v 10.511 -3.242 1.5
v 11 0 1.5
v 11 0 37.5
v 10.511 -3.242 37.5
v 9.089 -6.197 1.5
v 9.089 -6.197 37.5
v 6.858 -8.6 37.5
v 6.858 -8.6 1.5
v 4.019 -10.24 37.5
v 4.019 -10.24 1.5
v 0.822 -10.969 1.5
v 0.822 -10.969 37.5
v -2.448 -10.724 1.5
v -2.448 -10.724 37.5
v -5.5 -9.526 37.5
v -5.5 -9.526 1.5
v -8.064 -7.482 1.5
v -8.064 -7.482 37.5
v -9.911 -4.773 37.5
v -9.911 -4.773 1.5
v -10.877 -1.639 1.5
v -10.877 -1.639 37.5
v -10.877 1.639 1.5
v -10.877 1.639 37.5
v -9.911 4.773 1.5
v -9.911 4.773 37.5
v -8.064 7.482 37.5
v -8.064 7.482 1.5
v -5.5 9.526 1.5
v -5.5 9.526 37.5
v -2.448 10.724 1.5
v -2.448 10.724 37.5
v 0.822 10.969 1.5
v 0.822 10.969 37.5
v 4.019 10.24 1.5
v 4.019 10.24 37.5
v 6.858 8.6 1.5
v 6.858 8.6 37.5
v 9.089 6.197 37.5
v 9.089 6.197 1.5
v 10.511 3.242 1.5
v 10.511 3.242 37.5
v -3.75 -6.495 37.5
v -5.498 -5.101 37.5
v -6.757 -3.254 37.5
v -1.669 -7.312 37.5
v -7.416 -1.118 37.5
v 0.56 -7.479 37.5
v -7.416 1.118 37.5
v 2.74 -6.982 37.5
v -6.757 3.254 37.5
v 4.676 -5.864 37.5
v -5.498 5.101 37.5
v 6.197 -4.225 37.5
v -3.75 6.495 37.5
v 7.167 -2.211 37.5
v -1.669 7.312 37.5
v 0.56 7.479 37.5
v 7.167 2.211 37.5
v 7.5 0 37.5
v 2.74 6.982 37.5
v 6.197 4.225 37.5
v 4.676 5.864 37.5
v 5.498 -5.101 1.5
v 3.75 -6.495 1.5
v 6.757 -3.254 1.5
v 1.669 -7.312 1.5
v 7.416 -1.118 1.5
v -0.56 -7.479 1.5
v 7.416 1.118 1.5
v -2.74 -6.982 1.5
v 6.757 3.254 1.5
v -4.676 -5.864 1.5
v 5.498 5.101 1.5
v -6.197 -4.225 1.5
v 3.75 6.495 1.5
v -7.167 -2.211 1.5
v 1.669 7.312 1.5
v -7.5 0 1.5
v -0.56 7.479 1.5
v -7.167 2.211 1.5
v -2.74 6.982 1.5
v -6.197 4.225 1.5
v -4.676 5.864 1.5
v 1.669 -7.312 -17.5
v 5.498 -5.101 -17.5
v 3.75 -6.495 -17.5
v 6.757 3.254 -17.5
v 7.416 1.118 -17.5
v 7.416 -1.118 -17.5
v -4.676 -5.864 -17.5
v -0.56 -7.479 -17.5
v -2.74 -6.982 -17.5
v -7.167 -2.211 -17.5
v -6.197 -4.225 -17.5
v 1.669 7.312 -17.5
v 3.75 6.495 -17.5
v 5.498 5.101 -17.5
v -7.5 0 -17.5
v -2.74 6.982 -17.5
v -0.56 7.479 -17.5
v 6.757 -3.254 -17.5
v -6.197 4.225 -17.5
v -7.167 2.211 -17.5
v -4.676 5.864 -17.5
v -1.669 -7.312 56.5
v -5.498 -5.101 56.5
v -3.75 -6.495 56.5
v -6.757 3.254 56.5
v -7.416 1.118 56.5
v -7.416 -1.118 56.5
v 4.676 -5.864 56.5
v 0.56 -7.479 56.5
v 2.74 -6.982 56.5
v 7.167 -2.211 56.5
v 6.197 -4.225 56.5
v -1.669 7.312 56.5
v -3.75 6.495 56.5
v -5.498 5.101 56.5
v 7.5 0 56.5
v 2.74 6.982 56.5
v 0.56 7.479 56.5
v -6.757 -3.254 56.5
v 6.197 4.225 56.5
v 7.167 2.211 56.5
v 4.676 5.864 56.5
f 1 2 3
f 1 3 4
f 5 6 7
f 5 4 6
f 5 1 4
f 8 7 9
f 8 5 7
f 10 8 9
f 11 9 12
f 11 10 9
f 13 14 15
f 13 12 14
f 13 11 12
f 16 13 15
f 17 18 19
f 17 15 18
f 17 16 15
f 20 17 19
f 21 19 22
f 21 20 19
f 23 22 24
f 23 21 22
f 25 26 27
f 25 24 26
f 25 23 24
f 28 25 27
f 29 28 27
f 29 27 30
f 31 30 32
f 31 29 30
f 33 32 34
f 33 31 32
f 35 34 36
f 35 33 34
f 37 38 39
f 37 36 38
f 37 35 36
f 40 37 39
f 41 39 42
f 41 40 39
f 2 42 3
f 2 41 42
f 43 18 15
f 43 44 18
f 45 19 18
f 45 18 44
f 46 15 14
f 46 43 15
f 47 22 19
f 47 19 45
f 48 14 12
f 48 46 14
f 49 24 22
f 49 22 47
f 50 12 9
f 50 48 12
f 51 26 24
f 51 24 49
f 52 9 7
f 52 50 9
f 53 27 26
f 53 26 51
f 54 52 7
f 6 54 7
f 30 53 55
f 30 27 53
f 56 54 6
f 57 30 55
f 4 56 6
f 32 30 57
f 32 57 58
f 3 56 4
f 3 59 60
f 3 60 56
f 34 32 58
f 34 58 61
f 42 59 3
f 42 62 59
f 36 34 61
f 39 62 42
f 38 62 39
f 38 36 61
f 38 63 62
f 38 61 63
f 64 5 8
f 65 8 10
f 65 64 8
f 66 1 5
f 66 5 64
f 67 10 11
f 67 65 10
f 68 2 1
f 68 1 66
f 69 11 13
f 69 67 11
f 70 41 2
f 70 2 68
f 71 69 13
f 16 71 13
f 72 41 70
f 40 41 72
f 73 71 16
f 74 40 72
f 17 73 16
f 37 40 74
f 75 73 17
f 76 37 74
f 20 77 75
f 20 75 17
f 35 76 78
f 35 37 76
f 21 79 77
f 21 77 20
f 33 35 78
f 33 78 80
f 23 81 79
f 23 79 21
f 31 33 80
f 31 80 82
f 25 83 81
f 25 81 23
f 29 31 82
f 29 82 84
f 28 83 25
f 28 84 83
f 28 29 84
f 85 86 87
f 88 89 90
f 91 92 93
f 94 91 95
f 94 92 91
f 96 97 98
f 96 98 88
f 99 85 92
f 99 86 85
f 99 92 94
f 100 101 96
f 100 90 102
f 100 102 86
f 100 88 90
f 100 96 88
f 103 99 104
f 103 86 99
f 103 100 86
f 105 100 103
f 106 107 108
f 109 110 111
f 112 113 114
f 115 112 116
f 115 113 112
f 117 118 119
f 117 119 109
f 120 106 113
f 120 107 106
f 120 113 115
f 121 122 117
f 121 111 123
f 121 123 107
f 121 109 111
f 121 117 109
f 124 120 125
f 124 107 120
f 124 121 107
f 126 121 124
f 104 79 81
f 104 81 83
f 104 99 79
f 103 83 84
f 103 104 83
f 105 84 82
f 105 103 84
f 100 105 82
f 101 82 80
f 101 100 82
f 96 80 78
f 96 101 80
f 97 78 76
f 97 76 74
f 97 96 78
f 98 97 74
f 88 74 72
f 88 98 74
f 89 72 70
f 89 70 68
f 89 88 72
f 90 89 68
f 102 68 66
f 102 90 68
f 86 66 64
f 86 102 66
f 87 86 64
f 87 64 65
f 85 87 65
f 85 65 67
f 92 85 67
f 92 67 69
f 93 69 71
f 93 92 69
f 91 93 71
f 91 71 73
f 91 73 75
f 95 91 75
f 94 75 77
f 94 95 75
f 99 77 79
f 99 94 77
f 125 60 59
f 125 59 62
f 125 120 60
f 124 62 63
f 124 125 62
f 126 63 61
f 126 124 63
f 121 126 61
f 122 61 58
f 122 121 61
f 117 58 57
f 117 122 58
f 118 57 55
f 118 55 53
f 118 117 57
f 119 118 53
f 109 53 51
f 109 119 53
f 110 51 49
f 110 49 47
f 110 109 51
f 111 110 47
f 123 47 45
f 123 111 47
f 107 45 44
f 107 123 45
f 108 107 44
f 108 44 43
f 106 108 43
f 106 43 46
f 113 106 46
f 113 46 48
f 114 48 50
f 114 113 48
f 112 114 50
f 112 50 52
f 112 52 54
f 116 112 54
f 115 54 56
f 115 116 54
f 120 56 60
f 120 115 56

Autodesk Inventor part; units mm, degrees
ref_plane "YZ Plane" through (0, 0, 0) normal (1, 0, 0) x (0, 1, 0)
ref_plane "Start Plane" through (0, 0, 0) normal (0, 0, 1) x (1, 0, 0)
ref_plane "End Plane" through (0, 0, 39) normal (0, 0, 1) x (1, 0, 0)
sketch "Sketch" plane through (0, 0, 0) normal (0, 0, 1) x (1, 0, 0)
  circle A0 centre (0, 0) radius 11
  dimension "d0" = 22
extrude "Body" add sketch "Sketch" along normal up to surface (39 mm away) from surface at 0
sketch "Sketch3" plane through (0, 0, 0) normal (0, 0, 1) x (1, 0, 0)
  line L0 (0, 0) -> (10, 0)
ref_plane "Work Plane3" through (0, 0, 0) normal (0, -1, 0) x (1, 0, 0)
sketch "Sketch4" plane through (0, 0, 0) normal (0, -1, 0) x (1, 0, 0)
  line L0 (-2, 0) -> (12, 0)
  line L1 (-2, 39) -> (12, 39)
  dimension "d8" = 39
sketch "Sketch5" plane through (0, 0, 39) normal (0, 0, 1) x (1, 0, 0)
  circle A0 centre (0, 0) radius 7.5
  circle A1 centre (0, 0) radius 10.7703
  dimension "d9" = 15
extrude "Extrusion2" add sketch "Sketch5" along normal blind 17.5 contours A0
sketch "Sketch6" plane through (0, 0, 39) normal (0, 0, 1) x (1, 0, 0)
  circle A0 centre (0, 0) radius 11 projected
  circle A1 centre (0, 0) radius 7.5 projected
extrude "Extrusion3" cut sketch "Sketch6" against normal blind 1.5
sketch "Sketch7" plane through (0, 0, 0) normal (0, 0, -1) x (-1, 0, 0)
  circle A0 centre (0, 0) radius 7.5
  dimension "d16" = 15
extrude "Extrusion4" add sketch "Sketch7" along normal blind 17.5
sketch "Sketch8" plane through (0, 0, 0) normal (0, 0, -1) x (-1, 0, 0)
  circle A0 centre (0, 0) radius 7.5 projected
  circle A1 centre (0, 0) radius 11 projected
extrude "Extrusion5" cut sketch "Sketch8" against normal blind 1.5
equation "\"d0\" = G_H"
equation "\"d1\" = G_L"
equation "\"d16\" = d9"
equation "\"G_H\" = 22"
equation "\"G_L\" = d8"
equation "\"G_OFFSET_START\" = 0"
equation "\"G_OFFSET_END\" = 0"
equation "\"d5\" = G_OFFSET_END + B_L"
equation "\"B_L\" = 39"
equation "\"G_D\" = 22"
properties part number "ISO 1035/1 - 22 - 39" material "Steel, Mild"
